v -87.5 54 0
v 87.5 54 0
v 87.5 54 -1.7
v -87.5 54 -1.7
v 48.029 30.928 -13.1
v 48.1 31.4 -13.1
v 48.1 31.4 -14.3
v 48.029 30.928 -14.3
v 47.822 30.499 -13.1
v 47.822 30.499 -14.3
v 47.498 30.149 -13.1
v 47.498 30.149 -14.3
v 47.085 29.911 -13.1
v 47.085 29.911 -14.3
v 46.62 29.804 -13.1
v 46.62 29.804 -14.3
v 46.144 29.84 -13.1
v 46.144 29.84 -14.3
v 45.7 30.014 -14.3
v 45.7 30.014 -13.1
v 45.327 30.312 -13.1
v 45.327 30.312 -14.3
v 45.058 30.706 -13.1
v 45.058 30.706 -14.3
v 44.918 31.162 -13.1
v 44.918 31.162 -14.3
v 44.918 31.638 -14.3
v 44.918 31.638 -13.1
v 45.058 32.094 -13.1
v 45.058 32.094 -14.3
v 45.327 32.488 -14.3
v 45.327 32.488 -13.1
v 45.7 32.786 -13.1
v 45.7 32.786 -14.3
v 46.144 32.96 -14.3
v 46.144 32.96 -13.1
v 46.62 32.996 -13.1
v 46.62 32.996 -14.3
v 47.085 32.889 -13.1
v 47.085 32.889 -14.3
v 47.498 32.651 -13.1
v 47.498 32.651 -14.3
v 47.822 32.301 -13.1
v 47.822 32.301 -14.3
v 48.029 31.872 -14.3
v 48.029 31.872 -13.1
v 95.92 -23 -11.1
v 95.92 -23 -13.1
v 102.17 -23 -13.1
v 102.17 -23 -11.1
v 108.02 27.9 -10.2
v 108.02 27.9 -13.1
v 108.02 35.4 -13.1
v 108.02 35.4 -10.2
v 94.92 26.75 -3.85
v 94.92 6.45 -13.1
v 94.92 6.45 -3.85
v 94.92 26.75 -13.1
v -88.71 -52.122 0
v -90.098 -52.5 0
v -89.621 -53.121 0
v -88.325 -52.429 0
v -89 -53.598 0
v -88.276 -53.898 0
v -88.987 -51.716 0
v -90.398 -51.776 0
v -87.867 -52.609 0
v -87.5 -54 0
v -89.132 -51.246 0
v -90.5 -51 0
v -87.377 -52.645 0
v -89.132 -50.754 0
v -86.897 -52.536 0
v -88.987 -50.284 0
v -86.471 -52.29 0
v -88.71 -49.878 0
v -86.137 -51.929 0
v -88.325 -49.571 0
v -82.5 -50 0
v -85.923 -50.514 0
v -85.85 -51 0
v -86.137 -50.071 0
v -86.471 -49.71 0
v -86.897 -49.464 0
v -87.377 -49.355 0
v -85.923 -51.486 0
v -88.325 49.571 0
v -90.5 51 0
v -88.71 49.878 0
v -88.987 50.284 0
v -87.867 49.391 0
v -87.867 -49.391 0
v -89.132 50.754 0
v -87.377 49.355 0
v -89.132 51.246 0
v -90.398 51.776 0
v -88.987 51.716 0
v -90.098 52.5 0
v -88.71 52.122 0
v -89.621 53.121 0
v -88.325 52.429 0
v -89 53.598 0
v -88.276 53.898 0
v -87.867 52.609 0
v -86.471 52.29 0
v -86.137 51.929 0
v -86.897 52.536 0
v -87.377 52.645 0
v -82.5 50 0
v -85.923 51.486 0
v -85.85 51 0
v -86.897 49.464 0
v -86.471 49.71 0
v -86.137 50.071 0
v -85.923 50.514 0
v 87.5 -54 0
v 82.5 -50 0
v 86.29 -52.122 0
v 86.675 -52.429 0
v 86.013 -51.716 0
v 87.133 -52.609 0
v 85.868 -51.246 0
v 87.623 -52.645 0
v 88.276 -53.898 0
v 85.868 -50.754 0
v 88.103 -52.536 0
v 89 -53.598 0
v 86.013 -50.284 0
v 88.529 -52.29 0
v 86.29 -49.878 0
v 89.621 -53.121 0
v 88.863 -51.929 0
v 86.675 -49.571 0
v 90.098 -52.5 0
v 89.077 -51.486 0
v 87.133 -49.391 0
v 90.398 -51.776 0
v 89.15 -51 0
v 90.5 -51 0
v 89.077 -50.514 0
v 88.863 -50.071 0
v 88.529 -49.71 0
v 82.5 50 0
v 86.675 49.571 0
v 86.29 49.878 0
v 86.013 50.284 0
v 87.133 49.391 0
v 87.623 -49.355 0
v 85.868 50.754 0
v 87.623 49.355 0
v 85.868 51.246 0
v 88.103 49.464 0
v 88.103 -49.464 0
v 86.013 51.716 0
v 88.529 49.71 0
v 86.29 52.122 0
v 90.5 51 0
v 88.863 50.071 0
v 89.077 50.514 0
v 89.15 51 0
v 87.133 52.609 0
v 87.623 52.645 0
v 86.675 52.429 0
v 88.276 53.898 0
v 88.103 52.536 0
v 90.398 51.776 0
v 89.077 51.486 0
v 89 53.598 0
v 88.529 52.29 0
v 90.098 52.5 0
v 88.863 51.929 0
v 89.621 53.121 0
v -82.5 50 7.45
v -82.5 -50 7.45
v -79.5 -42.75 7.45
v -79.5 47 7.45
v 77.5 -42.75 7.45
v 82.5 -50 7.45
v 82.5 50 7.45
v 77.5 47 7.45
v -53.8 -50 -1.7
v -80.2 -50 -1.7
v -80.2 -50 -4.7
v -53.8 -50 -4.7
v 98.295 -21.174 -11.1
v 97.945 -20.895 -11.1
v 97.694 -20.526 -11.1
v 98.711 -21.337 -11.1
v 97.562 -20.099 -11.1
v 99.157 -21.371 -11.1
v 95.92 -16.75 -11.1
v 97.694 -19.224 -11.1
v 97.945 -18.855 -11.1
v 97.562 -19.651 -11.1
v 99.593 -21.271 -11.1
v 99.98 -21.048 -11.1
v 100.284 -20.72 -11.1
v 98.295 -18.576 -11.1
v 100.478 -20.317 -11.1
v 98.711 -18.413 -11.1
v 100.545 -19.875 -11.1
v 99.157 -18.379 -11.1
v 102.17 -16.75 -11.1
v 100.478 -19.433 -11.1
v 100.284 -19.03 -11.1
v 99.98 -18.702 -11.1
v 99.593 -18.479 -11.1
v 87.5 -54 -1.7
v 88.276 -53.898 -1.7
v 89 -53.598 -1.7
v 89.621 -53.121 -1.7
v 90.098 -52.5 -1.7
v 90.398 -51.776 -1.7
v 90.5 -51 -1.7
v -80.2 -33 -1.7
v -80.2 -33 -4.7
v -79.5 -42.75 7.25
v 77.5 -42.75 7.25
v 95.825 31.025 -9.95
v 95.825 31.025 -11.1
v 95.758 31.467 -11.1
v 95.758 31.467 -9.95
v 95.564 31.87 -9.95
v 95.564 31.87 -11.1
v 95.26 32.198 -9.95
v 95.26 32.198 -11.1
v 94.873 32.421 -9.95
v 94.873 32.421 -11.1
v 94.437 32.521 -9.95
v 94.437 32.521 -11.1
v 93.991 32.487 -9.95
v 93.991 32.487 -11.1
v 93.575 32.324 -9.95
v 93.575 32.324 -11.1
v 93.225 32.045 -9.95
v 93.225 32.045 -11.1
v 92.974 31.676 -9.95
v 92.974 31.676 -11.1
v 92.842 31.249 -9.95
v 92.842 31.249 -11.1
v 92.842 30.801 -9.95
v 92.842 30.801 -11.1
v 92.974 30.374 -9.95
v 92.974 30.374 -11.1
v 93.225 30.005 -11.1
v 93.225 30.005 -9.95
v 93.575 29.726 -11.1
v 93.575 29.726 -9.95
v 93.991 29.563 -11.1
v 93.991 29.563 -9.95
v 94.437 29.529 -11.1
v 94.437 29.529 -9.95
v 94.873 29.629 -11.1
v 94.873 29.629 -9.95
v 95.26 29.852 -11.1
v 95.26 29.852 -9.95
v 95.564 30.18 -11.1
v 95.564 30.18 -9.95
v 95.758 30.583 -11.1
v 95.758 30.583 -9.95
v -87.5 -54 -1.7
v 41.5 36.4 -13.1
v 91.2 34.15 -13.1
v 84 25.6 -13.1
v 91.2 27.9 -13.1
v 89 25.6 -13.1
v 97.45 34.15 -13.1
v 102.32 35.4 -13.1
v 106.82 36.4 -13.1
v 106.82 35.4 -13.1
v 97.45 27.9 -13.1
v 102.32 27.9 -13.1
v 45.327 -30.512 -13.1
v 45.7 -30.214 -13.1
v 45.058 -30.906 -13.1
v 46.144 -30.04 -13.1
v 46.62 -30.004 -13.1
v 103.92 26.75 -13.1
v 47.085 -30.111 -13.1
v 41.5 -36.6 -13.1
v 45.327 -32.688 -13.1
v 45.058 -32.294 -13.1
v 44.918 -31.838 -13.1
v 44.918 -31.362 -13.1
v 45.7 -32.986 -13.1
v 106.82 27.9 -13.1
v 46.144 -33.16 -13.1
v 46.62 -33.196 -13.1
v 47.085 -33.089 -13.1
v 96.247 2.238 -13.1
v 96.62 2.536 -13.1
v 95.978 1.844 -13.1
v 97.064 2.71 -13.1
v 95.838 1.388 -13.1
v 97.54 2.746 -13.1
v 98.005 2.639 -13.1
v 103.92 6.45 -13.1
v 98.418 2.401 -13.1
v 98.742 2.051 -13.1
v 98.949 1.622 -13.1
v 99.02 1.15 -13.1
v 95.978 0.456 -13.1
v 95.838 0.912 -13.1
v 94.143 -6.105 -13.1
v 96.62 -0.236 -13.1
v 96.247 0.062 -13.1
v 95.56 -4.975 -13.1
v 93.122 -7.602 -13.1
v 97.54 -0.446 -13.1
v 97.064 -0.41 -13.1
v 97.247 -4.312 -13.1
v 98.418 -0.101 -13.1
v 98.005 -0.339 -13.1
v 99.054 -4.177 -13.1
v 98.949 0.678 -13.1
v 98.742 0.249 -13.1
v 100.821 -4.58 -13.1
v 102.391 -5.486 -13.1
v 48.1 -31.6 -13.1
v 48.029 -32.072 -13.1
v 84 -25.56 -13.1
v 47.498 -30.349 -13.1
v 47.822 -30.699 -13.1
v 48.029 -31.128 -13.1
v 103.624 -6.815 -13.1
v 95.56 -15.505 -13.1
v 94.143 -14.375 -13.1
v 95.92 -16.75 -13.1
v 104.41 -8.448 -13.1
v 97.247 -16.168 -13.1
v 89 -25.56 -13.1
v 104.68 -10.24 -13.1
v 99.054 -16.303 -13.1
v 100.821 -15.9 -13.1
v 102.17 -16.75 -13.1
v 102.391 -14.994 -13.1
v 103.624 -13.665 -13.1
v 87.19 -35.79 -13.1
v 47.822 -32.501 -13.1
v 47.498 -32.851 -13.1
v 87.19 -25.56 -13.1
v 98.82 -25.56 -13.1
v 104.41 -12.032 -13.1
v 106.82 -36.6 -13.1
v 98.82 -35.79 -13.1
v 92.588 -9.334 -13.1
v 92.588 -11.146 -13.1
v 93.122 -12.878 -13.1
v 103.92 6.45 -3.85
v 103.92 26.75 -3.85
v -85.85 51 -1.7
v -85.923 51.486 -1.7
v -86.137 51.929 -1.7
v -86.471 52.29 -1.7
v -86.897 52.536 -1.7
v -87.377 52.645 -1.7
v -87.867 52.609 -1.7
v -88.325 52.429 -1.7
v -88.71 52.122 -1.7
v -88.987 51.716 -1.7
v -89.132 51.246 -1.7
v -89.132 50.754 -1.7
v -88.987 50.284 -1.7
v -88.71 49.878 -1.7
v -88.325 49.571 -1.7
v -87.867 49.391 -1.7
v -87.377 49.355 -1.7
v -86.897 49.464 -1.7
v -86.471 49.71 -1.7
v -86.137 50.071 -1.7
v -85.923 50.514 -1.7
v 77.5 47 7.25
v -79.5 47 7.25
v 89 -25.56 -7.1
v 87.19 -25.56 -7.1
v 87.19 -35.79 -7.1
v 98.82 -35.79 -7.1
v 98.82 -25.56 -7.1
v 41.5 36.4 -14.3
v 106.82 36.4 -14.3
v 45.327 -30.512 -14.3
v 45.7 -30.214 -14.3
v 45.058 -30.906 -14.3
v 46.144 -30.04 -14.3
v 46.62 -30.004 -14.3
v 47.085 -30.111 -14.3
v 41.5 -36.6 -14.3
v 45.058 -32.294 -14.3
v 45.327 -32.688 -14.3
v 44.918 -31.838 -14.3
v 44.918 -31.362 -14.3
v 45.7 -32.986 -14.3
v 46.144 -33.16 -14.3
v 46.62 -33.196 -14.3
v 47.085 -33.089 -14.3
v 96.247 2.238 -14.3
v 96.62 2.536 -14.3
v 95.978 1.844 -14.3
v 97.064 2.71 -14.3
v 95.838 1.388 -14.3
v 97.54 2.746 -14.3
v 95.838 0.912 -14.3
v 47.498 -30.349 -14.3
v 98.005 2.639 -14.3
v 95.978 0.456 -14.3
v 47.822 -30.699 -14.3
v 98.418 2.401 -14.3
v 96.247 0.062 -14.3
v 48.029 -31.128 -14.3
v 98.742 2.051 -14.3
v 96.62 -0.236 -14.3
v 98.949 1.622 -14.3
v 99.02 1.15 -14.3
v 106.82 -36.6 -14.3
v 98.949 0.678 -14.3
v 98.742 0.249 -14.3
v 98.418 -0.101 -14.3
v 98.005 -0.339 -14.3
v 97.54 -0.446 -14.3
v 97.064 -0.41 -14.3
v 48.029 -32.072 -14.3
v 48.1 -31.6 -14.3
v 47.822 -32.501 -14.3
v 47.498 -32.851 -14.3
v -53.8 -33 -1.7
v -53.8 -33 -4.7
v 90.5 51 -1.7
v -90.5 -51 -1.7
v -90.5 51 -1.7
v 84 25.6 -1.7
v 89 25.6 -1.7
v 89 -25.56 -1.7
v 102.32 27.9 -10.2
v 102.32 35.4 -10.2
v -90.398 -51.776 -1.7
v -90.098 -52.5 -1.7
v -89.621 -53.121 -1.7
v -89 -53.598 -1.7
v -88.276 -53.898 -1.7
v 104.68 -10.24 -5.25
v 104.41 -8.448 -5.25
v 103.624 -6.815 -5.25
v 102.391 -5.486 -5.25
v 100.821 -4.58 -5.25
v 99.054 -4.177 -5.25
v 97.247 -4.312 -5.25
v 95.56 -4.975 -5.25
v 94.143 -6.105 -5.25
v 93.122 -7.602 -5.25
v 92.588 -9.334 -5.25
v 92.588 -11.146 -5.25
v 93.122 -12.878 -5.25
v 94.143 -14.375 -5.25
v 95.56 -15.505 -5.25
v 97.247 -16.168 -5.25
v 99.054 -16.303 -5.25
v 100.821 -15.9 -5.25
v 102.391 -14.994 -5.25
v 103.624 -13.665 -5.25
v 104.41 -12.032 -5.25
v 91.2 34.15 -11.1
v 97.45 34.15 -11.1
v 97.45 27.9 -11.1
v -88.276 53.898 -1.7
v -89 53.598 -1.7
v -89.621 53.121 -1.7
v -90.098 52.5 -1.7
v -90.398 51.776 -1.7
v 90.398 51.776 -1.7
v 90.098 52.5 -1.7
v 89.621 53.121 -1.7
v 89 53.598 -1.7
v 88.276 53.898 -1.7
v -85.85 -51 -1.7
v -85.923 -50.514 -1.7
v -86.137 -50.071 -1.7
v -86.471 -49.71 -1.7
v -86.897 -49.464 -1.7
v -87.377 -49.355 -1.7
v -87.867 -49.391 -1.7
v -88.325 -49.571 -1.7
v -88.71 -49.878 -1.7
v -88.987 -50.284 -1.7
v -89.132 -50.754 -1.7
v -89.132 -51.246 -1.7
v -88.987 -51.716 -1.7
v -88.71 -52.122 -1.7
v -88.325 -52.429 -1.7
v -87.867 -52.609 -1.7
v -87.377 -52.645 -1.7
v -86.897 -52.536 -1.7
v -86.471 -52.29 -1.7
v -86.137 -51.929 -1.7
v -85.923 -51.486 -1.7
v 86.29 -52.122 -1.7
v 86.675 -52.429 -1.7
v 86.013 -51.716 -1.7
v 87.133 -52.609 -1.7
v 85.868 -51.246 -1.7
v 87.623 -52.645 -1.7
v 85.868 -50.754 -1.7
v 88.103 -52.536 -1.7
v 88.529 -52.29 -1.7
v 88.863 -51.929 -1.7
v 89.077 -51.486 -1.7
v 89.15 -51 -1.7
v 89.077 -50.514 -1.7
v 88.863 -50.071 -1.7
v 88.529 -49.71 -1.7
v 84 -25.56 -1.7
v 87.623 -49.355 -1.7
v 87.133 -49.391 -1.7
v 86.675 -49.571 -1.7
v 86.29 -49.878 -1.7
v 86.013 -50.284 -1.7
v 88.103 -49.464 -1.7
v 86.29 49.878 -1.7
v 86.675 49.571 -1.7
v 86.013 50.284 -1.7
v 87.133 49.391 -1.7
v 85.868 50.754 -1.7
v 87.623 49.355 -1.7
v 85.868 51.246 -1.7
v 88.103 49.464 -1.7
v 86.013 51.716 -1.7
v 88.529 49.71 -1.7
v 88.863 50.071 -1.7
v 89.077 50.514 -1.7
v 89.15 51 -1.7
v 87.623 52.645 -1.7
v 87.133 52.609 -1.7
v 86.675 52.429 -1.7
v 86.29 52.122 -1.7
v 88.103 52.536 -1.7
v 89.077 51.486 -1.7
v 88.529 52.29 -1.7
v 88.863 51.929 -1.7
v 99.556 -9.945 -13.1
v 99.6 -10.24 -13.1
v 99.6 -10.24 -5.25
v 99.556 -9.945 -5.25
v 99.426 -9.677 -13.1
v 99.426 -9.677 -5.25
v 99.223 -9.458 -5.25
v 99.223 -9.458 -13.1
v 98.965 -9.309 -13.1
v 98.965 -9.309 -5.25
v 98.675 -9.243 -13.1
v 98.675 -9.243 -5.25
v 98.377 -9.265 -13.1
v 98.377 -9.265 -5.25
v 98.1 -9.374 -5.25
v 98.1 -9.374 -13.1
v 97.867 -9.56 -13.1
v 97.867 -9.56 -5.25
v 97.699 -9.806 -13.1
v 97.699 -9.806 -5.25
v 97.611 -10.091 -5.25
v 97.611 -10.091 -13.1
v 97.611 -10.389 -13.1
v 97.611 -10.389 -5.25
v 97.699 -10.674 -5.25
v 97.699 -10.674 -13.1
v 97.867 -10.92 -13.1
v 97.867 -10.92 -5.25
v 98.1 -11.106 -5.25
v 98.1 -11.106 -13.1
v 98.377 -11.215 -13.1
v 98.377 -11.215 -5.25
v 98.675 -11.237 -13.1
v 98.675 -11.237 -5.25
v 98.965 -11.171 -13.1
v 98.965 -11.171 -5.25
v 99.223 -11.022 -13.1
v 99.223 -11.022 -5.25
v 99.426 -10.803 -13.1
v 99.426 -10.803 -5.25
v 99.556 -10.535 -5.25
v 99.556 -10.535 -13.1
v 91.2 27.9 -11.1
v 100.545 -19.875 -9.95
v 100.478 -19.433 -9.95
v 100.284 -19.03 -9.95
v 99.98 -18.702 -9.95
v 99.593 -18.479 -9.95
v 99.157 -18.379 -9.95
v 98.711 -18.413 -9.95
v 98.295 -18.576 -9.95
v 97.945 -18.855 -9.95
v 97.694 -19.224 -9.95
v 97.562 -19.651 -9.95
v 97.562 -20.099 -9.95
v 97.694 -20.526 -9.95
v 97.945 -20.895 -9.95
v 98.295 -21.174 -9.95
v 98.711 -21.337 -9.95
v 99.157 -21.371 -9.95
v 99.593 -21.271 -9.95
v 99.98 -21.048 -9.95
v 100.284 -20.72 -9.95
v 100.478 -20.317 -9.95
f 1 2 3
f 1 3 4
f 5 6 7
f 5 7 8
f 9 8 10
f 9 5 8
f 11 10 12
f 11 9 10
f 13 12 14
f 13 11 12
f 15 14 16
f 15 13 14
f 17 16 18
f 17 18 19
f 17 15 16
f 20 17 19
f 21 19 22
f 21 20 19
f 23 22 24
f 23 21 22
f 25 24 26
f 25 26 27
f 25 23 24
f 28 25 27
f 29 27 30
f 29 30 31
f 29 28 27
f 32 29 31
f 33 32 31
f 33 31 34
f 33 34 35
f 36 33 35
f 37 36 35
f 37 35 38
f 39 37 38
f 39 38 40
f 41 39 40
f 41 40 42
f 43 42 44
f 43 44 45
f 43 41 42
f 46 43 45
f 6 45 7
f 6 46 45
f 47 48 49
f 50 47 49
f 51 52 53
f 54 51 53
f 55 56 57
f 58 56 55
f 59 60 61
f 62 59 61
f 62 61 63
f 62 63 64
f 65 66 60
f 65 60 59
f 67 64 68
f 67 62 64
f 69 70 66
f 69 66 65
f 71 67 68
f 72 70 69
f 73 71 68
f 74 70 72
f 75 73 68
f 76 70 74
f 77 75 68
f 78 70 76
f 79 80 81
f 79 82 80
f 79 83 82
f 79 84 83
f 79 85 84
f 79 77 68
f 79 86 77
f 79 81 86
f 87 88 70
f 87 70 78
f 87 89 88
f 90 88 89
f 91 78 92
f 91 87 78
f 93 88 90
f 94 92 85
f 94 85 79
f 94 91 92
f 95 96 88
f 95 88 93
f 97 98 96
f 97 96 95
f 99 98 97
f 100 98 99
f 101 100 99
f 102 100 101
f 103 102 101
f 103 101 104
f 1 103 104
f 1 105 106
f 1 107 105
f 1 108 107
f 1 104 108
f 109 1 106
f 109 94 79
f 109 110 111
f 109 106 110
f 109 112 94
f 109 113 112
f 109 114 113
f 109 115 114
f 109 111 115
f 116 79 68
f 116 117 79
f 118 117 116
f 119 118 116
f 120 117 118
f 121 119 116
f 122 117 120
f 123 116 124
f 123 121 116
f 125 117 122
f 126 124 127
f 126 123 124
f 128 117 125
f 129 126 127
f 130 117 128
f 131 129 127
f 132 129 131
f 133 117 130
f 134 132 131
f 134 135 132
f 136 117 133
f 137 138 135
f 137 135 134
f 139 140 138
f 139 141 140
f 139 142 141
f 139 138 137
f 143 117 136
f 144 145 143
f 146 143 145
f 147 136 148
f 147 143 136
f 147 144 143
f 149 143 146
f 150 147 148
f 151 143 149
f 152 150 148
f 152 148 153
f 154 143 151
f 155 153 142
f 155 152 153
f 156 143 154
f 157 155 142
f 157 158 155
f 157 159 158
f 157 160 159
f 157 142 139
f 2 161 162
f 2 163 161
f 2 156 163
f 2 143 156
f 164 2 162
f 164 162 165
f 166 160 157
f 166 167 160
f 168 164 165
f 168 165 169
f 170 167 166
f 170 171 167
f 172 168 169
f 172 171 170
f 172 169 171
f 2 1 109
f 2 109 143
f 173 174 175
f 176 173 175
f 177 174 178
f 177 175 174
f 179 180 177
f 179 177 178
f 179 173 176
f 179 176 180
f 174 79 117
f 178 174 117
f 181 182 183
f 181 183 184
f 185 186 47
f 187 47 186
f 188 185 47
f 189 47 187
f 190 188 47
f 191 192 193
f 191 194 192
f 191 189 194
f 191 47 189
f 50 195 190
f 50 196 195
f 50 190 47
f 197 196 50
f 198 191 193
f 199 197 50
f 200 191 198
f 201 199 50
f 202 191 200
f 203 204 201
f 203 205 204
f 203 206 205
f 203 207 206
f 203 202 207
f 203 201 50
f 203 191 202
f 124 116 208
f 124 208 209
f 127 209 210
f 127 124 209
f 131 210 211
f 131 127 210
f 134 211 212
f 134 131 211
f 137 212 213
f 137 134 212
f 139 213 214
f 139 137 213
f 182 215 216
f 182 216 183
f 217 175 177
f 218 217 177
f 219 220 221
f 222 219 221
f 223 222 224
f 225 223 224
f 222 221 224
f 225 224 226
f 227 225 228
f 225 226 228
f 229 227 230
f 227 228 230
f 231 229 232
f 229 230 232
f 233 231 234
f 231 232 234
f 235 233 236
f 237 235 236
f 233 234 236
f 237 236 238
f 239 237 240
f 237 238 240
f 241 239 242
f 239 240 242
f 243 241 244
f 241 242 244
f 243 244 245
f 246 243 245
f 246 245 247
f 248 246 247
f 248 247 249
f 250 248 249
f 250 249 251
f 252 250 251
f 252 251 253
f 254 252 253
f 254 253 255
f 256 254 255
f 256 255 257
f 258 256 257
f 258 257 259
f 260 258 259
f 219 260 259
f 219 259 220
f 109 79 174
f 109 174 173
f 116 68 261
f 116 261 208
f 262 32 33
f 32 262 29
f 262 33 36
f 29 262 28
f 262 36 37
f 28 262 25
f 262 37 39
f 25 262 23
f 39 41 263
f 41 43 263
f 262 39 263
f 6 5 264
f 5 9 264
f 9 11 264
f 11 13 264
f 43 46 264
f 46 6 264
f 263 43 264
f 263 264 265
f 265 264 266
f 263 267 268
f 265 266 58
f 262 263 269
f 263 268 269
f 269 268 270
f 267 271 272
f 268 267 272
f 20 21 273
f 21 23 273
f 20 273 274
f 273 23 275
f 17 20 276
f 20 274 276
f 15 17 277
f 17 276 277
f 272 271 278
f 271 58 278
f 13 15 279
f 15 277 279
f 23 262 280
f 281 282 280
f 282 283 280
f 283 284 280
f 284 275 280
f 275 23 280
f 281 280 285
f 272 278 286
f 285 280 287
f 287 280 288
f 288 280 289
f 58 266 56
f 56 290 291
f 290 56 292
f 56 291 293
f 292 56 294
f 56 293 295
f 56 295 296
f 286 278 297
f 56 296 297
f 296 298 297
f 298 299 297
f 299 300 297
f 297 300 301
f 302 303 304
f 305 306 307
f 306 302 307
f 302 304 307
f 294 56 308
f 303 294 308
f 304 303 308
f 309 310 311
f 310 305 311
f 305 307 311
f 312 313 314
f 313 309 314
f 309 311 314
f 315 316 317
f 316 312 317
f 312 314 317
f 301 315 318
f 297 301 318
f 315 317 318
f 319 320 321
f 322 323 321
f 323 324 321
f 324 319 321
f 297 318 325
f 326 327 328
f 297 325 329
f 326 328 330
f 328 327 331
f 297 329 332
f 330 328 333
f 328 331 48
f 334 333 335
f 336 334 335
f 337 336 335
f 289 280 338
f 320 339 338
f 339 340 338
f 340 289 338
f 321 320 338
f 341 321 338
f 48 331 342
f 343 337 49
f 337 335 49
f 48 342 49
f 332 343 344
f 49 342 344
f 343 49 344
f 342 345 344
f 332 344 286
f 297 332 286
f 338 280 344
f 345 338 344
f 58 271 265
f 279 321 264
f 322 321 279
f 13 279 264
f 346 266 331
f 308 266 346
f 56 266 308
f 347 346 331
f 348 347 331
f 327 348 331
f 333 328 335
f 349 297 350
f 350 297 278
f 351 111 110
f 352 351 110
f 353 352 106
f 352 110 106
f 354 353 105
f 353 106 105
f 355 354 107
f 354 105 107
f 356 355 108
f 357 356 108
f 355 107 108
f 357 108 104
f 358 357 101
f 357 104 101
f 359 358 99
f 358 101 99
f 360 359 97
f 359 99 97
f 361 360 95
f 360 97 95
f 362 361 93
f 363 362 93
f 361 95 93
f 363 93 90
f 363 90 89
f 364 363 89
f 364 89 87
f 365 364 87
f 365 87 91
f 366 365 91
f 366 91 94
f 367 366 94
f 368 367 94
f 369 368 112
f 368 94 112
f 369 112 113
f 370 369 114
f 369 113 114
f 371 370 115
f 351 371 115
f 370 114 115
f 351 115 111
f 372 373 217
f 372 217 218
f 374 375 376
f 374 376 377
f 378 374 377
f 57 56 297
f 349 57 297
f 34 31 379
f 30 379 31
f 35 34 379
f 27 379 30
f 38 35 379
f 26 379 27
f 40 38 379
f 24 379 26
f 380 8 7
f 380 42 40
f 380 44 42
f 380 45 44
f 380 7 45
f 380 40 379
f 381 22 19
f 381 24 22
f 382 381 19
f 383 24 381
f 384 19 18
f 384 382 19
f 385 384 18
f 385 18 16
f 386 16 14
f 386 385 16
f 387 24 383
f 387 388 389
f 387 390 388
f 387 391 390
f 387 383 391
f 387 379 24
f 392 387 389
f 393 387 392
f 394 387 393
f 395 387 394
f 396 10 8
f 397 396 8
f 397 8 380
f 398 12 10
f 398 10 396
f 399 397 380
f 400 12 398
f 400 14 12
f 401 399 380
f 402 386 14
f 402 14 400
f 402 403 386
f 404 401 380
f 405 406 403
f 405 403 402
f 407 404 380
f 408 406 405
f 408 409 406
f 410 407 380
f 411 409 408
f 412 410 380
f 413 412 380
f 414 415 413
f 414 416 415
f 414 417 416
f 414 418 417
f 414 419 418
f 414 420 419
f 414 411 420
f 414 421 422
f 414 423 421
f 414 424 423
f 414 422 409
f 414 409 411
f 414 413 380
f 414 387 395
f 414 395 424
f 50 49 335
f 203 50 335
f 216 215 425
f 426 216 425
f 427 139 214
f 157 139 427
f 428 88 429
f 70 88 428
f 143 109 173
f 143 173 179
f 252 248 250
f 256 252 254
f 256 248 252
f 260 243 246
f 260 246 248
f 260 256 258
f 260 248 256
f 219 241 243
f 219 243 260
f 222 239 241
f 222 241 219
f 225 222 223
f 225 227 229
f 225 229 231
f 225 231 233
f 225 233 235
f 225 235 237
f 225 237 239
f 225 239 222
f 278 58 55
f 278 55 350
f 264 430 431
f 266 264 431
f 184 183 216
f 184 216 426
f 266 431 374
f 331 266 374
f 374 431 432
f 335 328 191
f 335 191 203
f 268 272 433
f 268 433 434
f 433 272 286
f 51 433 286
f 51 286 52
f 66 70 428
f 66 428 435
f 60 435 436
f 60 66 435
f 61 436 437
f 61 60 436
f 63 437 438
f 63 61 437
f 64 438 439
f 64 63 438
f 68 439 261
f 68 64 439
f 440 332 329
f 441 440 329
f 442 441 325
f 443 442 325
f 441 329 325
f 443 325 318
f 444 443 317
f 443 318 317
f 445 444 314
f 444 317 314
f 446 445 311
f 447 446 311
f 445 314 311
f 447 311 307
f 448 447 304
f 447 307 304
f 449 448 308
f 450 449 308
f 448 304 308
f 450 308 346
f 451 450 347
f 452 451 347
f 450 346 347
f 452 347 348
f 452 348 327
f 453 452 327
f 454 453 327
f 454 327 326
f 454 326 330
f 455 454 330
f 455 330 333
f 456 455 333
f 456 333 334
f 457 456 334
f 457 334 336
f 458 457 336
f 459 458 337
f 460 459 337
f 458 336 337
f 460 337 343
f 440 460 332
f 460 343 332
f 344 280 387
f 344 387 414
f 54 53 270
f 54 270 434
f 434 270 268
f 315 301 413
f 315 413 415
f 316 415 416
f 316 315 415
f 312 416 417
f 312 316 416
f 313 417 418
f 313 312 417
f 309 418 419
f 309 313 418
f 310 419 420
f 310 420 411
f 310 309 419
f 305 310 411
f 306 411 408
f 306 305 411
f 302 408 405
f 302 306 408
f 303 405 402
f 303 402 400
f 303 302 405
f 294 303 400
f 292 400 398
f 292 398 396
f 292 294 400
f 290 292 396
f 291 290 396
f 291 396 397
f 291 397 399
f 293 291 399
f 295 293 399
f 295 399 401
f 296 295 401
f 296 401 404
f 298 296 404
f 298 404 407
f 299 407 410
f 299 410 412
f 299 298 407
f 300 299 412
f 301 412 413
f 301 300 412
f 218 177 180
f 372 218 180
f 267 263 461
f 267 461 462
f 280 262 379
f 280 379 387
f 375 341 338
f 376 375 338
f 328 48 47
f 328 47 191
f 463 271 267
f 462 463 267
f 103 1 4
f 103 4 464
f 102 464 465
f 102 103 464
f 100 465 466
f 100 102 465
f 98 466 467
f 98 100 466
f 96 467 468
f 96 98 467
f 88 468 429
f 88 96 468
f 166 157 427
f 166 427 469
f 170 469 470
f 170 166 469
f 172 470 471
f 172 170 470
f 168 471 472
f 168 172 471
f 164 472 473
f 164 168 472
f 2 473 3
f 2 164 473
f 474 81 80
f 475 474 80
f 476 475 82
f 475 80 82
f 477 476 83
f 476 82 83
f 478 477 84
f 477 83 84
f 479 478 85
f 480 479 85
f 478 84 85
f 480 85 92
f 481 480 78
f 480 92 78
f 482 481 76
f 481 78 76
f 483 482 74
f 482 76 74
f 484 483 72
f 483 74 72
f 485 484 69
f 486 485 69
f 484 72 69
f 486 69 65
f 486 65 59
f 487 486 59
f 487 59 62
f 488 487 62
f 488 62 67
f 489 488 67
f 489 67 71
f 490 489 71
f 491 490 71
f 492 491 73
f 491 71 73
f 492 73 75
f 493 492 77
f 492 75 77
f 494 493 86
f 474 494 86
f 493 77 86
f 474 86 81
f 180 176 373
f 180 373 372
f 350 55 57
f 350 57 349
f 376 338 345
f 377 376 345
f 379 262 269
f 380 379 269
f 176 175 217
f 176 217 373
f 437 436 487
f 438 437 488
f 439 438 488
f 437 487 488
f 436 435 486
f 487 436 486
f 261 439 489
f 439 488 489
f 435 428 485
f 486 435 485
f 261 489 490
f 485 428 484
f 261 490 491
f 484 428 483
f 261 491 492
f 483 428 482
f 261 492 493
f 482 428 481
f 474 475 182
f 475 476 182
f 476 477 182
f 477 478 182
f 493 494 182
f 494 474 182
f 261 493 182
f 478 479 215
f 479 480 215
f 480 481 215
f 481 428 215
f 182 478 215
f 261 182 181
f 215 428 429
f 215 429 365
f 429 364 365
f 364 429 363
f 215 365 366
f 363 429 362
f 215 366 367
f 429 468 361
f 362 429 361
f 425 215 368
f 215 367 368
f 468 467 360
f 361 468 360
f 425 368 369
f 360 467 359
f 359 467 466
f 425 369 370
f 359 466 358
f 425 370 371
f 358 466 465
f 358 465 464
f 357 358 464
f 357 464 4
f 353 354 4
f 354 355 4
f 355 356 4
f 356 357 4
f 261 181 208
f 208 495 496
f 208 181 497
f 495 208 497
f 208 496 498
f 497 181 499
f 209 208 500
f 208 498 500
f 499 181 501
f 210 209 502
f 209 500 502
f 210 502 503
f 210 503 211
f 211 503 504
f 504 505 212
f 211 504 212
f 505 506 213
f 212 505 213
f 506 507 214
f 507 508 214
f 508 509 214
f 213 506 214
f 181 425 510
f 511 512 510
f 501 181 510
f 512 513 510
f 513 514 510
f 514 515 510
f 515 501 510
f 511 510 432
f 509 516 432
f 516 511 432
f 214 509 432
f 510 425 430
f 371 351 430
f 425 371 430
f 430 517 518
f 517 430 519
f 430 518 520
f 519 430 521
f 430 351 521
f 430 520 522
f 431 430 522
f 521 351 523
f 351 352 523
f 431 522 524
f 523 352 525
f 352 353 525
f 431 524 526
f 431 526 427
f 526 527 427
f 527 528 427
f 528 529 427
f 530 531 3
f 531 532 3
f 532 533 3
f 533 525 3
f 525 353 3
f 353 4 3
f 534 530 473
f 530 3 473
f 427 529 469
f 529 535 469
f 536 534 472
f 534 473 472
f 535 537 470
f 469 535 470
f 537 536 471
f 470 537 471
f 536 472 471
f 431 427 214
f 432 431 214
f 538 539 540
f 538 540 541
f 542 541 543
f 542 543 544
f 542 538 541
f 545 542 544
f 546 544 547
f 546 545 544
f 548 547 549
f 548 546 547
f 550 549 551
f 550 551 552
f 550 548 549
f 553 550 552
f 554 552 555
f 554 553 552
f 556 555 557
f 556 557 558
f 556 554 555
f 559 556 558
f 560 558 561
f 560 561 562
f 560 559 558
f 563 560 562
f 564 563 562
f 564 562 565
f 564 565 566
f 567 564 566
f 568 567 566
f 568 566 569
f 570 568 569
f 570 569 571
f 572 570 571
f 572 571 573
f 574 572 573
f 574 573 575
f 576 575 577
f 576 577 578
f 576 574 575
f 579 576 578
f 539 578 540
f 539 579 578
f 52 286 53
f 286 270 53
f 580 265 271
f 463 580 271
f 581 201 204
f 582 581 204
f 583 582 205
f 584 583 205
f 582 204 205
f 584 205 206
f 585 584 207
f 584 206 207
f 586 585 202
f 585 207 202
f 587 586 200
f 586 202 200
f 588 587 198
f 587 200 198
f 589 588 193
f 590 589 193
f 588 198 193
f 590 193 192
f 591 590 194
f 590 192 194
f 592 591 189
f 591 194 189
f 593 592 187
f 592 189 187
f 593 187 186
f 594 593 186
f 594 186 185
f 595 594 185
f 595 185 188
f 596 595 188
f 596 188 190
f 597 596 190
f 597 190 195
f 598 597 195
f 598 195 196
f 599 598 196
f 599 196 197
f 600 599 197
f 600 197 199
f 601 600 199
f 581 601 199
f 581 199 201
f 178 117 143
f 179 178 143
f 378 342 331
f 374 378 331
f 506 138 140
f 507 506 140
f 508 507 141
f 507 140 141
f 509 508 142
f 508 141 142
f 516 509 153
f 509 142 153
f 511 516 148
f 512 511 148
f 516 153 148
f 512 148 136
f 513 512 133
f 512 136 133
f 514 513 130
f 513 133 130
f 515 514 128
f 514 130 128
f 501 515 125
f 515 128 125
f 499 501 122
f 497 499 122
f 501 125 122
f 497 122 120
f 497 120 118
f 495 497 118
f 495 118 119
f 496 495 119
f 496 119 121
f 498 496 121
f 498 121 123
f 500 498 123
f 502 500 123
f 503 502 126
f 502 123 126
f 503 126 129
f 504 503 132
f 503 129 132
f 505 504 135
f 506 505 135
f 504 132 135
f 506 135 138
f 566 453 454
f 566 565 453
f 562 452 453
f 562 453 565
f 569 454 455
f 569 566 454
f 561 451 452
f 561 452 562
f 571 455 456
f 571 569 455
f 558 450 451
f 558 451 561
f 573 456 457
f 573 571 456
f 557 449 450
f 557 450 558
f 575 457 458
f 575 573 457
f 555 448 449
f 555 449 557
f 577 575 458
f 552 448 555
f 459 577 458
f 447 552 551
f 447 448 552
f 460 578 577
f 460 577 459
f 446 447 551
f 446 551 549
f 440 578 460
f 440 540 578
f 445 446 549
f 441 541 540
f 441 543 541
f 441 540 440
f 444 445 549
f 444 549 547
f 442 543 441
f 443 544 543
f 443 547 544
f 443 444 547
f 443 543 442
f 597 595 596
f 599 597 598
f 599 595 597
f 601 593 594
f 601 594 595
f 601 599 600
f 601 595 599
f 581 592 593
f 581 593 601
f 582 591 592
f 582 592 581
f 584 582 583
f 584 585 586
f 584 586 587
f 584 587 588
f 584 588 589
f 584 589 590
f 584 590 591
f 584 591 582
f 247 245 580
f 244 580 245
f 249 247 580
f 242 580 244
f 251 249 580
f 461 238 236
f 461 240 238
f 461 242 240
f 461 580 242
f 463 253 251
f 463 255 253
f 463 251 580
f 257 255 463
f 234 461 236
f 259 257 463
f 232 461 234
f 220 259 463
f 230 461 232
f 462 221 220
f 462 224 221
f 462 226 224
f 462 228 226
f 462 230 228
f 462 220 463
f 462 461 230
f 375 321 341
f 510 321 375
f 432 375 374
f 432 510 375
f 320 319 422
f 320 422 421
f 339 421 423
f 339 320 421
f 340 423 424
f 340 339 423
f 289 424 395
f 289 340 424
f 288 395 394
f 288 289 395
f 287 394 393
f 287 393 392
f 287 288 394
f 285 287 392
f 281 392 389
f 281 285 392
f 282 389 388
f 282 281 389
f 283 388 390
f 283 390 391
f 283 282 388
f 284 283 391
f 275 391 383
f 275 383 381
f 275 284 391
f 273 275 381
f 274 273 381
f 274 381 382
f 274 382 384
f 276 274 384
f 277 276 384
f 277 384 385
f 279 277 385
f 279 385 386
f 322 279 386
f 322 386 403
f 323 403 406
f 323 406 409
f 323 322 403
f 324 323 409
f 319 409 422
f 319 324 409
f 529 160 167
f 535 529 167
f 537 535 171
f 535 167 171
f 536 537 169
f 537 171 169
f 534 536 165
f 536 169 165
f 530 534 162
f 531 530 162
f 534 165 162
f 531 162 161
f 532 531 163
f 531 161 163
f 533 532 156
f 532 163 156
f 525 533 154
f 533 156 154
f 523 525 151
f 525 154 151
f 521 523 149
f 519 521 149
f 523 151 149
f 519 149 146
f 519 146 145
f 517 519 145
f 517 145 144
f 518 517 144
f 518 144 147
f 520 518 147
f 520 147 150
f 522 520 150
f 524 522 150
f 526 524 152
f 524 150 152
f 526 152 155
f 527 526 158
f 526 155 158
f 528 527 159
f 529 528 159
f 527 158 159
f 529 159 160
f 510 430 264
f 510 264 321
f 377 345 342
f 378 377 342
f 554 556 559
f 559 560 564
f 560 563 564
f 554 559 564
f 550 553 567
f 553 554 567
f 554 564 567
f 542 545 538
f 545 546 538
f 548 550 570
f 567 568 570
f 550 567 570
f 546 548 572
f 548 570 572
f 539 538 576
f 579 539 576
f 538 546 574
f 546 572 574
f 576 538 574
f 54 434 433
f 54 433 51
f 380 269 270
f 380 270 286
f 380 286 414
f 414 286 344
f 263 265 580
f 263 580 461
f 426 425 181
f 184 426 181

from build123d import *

# Parameters (mm, degrees)
F0_R      = 1.65
F0_W      = 165
F0_H      = 100
F1_DEPTH  = 1.7
F2_DEPTH  = 7.45
F3_W      = 157
F3_H      = 89.75
F4_DEPTH  = 0.2
F5_W      = 5
F5_H      = 51.16
F6_DEPTH  = 11.4
F5_W_2    = 26.4
F5_H_2    = 17
F7_DEPTH  = 3
F8_W      = 65.32
F8_H      = 73
F8_R      = 1.6
F8_W_2    = 5
F8_H_2    = 51.16
F9_DEPTH  = 1.2
F11_DEPTH = 6
F10_R     = 6.08
F10_R_2   = 1
F12_DEPTH = 7.85
F10_W     = 9
F10_H     = 20.3
F13_DEPTH = 9.25
F10_R_3   = 1.5
F14_DEPTH = 3.15
F10_W_2   = 6.25
F10_H_2   = 6.25
F15_DEPTH = 2
F10_W_3   = 1.2
F10_H_3   = 7.5
F10_W_4   = 4.5
F16_DEPTH = 2.9


with BuildPart() as f1:
    # F0 (on Top) → F1 (new body)
    with BuildSketch(Plane.XY):
        with BuildLine():
            Line((-87.5, -54), (87.5, -54))
            ThreePointArc((87.5, -54), (89.6213203436, -53.1213203436), (90.5, -51))
            Line((90.5, -51), (90.5, 51))
            ThreePointArc((90.5, 51), (89.6213203436, 53.1213203436), (87.5, 54))
            Line((87.5, 54), (-87.5, 54))
            ThreePointArc((-87.5, 54), (-89.6213203436, 53.1213203436), (-90.5, 51))
            Line((-90.5, 51), (-90.5, -51))
            ThreePointArc((-90.5, -51), (-89.6213203436, -53.1213203436), (-87.5, -54))
        make_face()
        with Locations((-87.5, -51)):
            Circle(F0_R, mode=Mode.SUBTRACT)
        with Locations((87.5, -51)):
            Circle(F0_R, mode=Mode.SUBTRACT)
        with Locations((-87.5, 51)):
            Circle(F0_R, mode=Mode.SUBTRACT)
        Rectangle(F0_W, F0_H, mode=Mode.SUBTRACT)
        with Locations((87.5, 51)):
            Circle(F0_R, mode=Mode.SUBTRACT)
        Rectangle(F0_W, F0_H)
    extrude(amount=-F1_DEPTH)

    # F0 (on Top) → F2 (join)
    with BuildSketch(Plane.XY):
        Rectangle(F0_W, F0_H)
    extrude(amount=F2_DEPTH)

    # F3 (on face) → F4 (cut)
    with BuildSketch(Plane.XY.offset(7.45)):
        with Locations((-1, 2.125)):
            Rectangle(F3_W, F3_H)
    extrude(amount=-F4_DEPTH, mode=Mode.SUBTRACT)

    # F5 (on face) → F6 (join)
    with BuildSketch(Plane(origin=(0, 0, -1.7), x_dir=(1, 0, 0), z_dir=(0, 0, -1))):
        with Locations((86.5, -0.02)):
            Rectangle(F5_W, F5_H)
    extrude(amount=F6_DEPTH)

    # F5 (on face) → F7 (join)
    with BuildSketch(Plane(origin=(0, 0, -1.7), x_dir=(1, 0, 0), z_dir=(0, 0, -1))):
        with Locations((-67, 41.5)):
            Rectangle(F5_W_2, F5_H_2)
    extrude(amount=F7_DEPTH)

    # F8 (on face) → F9 (join)
    with BuildSketch(Plane(origin=(0, 0, -13.1), x_dir=(1, 0, 0), z_dir=(0, 0, -1))):
        with Locations((74.16, 0.1)):
            Rectangle(F8_W, F8_H)
        with Locations((46.5, -31.4)):
            Circle(F8_R, mode=Mode.SUBTRACT)
        with Locations((86.5, -0.02)):
            Rectangle(F8_W_2, F8_H_2, mode=Mode.SUBTRACT)
        with Locations((97.42, -1.15)):
            Circle(F8_R, mode=Mode.SUBTRACT)
        with Locations((46.5, 31.6)):
            Circle(F8_R, mode=Mode.SUBTRACT)
        with Locations((86.5, -0.02)):
            Rectangle(F8_W_2, F8_H_2)
    extrude(amount=F9_DEPTH)

    # F10 (on face) → F11 (join)
    with BuildSketch(Plane.XY.offset(-13.1)):
        Polygon((89, -25.56), (87.19, -25.56), (87.19, -35.79), (98.82, -35.79), (98.82, -25.56), align=None)
    extrude(amount=F11_DEPTH)

    # F10 (on face) → F12 (join)
    with BuildSketch(Plane.XY.offset(-13.1)):
        with Locations((98.6, -10.24)):
            Circle(F10_R)
        with Locations((98.6, -10.24)):
            Circle(F10_R_2, mode=Mode.SUBTRACT)
    extrude(amount=F12_DEPTH)

    # F10 (on face) → F13 (join)
    with BuildSketch(Plane.XY.offset(-13.1)):
        with Locations((99.42, 16.6)):
            Rectangle(F10_W, F10_H)
    extrude(amount=F13_DEPTH)

    # F10 (on face) → F14 (join)
    with BuildSketch(Plane.XY.offset(-13.1)):
        with Locations((94.325, 31.025)):
            Circle(F10_R_3)
        with Locations((99.045, -19.875)):
            Circle(F10_R_3)
    extrude(amount=F14_DEPTH)

    # F10 (on face) → F15 (join)
    with BuildSketch(Plane.XY.offset(-13.1)):
        with Locations((94.325, 31.025)):
            Rectangle(F10_W_2, F10_H_2)
        with Locations((94.325, 31.025)):
            Circle(F10_R_3, mode=Mode.SUBTRACT)
        with Locations((99.045, -19.875)):
            Rectangle(F10_W_2, F10_H_2)
        with Locations((99.045, -19.875)):
            Circle(F10_R_3, mode=Mode.SUBTRACT)
    extrude(amount=F15_DEPTH)

    # F10 (on face) → F16 (join)
    with BuildSketch(Plane.XY.offset(-13.1)):
        with Locations((107.42, 31.65)):
            Rectangle(F10_W_3, F10_H_3)
        with Locations((104.57, 31.65)):
            Rectangle(F10_W_4, F10_H_3)
    extrude(amount=F16_DEPTH)


solid = f1.part
